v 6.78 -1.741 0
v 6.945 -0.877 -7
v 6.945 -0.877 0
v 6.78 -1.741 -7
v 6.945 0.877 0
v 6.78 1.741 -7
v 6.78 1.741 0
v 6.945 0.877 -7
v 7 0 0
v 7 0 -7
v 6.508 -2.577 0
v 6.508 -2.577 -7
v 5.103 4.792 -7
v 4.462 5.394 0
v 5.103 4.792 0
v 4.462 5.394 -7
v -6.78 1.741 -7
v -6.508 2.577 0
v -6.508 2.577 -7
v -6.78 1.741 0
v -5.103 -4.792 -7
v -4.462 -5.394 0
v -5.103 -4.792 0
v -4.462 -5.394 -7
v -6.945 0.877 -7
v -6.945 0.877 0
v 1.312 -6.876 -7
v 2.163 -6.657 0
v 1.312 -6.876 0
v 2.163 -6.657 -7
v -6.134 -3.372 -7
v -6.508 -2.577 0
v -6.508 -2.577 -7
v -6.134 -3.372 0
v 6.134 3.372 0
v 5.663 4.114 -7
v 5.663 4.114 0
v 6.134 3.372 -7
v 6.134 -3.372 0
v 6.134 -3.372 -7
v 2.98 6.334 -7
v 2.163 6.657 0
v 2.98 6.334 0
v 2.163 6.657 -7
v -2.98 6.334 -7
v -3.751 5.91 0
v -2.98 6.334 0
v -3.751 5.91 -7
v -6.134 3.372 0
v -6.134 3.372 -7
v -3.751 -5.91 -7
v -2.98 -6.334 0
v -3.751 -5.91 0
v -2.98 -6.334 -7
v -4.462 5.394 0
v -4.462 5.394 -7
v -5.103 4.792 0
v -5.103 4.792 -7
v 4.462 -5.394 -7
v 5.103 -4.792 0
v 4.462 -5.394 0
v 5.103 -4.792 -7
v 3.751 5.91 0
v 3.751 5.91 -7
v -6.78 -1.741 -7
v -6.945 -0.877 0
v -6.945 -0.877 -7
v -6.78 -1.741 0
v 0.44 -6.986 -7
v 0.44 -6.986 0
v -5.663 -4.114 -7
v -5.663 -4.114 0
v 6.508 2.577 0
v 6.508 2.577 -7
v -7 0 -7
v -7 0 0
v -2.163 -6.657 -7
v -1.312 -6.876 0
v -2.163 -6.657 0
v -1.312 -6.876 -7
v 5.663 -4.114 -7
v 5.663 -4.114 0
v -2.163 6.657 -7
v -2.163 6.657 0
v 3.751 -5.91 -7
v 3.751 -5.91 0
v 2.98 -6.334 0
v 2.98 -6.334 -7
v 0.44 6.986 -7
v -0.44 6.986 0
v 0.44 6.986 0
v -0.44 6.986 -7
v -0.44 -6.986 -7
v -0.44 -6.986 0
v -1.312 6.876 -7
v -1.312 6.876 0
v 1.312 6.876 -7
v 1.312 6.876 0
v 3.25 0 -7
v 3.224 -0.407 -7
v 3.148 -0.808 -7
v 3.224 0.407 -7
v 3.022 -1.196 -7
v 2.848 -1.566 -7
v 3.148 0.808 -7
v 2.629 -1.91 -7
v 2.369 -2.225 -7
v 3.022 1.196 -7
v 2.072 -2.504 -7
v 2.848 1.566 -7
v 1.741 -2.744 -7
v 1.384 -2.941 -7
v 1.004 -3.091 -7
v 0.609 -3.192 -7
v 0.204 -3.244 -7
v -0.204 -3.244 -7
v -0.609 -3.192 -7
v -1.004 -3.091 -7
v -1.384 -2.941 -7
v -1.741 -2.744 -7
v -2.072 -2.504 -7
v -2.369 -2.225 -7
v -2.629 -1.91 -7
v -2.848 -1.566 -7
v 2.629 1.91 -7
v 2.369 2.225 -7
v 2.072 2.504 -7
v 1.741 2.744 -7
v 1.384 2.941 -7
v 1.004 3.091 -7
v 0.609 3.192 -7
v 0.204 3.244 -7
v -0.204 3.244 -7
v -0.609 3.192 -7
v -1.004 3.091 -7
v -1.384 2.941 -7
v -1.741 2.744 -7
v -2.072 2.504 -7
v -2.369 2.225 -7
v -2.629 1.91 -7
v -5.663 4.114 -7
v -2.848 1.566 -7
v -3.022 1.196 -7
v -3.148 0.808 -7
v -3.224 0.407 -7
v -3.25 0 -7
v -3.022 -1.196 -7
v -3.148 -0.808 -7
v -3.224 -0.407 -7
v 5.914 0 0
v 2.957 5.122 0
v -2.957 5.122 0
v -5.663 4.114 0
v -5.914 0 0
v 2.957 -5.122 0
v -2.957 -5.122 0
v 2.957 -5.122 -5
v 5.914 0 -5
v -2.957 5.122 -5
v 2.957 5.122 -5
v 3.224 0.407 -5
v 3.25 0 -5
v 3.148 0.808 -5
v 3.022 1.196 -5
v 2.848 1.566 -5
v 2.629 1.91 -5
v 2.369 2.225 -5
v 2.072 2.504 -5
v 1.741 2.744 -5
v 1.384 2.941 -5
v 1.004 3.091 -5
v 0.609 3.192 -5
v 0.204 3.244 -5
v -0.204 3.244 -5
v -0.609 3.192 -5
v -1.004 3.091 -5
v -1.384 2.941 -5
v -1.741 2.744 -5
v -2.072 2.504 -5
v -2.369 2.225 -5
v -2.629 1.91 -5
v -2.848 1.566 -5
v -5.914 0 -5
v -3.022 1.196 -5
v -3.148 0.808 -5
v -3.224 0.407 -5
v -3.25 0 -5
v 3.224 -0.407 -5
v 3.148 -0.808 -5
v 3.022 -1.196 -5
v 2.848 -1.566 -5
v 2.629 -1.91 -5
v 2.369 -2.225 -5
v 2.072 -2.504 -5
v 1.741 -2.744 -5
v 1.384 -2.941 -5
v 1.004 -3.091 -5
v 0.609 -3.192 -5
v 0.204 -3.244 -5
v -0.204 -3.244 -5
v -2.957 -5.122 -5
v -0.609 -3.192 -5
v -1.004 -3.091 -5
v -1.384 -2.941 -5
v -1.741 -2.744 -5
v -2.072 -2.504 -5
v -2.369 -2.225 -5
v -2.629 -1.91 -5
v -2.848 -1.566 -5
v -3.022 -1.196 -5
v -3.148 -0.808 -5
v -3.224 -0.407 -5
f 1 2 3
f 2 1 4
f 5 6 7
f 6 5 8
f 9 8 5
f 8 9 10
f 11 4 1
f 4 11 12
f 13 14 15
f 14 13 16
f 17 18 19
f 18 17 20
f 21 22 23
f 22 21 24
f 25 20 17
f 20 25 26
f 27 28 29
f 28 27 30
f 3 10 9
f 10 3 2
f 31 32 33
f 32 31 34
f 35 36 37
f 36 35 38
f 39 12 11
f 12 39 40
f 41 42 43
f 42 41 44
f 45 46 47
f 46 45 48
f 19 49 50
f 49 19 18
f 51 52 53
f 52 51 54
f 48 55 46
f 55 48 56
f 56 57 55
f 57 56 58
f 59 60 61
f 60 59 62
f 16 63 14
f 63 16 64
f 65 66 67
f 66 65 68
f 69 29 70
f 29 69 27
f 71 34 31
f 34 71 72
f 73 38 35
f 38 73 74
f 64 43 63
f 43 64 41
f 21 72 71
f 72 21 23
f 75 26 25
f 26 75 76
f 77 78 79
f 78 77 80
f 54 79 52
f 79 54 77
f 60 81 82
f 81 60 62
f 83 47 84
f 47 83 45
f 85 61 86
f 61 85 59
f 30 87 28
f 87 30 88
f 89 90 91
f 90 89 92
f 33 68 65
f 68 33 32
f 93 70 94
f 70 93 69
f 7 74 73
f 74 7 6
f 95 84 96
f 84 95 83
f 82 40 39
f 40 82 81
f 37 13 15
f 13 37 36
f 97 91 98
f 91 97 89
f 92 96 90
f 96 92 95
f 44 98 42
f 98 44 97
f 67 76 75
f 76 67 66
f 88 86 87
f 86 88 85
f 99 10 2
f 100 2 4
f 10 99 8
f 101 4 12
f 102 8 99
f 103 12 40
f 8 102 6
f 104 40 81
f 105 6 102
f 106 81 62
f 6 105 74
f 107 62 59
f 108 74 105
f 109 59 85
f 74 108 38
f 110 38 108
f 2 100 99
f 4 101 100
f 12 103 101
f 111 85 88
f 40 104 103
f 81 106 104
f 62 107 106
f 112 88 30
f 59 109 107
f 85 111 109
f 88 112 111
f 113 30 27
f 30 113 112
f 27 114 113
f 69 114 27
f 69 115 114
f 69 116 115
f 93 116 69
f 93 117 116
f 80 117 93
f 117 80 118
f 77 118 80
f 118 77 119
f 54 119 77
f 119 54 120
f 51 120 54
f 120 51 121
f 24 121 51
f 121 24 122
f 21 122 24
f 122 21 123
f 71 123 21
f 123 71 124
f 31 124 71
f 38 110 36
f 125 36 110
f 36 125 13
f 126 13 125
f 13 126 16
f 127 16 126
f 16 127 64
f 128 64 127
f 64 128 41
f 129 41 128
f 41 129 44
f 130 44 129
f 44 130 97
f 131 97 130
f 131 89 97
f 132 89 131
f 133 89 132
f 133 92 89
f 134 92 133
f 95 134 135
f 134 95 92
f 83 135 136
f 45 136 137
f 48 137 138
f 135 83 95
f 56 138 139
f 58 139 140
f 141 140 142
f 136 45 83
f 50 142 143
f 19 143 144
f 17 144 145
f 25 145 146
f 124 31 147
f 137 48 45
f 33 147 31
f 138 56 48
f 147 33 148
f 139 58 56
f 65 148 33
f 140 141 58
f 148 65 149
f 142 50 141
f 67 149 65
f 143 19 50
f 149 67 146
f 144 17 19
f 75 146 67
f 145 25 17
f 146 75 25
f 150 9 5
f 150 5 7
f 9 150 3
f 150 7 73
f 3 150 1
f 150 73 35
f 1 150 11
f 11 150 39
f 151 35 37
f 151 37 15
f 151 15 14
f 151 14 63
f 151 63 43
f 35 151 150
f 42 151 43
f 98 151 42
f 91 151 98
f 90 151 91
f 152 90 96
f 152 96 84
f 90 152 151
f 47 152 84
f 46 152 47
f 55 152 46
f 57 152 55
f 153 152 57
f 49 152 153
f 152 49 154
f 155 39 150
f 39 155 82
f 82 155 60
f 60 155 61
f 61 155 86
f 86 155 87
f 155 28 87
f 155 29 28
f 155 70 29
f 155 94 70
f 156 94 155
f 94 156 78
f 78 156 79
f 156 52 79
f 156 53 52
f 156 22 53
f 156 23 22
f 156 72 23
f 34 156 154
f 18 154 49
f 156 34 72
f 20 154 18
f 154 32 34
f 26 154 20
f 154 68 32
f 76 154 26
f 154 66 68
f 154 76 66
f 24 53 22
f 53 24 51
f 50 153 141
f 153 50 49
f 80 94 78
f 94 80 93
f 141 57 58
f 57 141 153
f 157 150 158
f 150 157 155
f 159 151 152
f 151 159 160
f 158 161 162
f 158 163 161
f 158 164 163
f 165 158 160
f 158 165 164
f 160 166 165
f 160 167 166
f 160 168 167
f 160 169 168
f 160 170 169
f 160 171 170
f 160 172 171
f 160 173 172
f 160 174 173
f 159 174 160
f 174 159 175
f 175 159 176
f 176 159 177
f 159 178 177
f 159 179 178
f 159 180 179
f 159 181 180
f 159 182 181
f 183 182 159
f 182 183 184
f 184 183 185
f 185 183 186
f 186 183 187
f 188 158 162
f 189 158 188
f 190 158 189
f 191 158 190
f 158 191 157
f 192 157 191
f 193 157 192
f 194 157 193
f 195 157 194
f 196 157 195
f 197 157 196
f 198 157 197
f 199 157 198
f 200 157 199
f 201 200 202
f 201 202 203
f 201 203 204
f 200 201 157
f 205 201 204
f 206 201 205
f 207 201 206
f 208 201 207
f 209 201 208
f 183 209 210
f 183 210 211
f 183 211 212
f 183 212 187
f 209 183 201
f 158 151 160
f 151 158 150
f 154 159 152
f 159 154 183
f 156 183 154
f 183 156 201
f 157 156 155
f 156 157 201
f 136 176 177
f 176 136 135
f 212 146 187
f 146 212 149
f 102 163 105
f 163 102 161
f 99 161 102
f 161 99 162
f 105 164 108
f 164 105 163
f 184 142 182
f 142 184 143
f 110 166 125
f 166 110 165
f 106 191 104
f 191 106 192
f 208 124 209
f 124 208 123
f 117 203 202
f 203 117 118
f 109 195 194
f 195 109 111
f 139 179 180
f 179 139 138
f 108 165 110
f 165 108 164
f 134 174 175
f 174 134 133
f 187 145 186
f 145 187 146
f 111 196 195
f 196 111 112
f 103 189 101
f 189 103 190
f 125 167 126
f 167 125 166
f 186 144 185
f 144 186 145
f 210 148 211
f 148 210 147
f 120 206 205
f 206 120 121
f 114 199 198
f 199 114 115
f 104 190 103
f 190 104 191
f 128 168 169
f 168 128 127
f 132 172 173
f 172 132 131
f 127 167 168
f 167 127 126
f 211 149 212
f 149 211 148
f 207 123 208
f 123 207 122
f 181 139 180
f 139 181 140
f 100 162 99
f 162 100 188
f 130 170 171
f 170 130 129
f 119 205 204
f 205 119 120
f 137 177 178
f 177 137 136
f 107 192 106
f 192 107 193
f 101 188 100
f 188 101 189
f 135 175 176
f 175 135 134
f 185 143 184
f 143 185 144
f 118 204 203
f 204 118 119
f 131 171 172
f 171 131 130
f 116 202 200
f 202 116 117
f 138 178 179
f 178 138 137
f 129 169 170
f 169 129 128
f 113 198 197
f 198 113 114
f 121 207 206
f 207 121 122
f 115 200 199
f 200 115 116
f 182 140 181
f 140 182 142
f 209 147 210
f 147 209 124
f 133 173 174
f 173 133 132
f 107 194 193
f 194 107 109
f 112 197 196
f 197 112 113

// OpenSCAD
$fn = 50;


difference() {
	union() {
		translate(v = [0, 0, -7.0000000000]) {
			cylinder(h = 7.0000000000, r = 7.0000000000);
		}
		translate(v = [0, 0, -5.5000000000]) {
			cylinder(h = 5.5000000000, r = 2.8750000000);
		}
	}
	union() {
		translate(v = [0, 0, 0]) {
			rotate(a = [0, 0, 0]) {
				difference() {
					union() {
						translate(v = [0, 0, -5]) {
							linear_extrude(height = 5) {
								polygon(points = [[5.9142500000, 0.0000000000], [2.9571250000, 5.1218907443], [-2.9571250000, 5.1218907443], [-5.9142500000, 0.0000000000], [-2.9571250000, -5.1218907443], [2.9571250000, -5.1218907443]]);
							}
						}
					}
					union();
				}
			}
		}
		#translate(v = [0, 0, -100.0000000000]) {
			cylinder(h = 200, r = 3.2500000000);
		}
	}
}
